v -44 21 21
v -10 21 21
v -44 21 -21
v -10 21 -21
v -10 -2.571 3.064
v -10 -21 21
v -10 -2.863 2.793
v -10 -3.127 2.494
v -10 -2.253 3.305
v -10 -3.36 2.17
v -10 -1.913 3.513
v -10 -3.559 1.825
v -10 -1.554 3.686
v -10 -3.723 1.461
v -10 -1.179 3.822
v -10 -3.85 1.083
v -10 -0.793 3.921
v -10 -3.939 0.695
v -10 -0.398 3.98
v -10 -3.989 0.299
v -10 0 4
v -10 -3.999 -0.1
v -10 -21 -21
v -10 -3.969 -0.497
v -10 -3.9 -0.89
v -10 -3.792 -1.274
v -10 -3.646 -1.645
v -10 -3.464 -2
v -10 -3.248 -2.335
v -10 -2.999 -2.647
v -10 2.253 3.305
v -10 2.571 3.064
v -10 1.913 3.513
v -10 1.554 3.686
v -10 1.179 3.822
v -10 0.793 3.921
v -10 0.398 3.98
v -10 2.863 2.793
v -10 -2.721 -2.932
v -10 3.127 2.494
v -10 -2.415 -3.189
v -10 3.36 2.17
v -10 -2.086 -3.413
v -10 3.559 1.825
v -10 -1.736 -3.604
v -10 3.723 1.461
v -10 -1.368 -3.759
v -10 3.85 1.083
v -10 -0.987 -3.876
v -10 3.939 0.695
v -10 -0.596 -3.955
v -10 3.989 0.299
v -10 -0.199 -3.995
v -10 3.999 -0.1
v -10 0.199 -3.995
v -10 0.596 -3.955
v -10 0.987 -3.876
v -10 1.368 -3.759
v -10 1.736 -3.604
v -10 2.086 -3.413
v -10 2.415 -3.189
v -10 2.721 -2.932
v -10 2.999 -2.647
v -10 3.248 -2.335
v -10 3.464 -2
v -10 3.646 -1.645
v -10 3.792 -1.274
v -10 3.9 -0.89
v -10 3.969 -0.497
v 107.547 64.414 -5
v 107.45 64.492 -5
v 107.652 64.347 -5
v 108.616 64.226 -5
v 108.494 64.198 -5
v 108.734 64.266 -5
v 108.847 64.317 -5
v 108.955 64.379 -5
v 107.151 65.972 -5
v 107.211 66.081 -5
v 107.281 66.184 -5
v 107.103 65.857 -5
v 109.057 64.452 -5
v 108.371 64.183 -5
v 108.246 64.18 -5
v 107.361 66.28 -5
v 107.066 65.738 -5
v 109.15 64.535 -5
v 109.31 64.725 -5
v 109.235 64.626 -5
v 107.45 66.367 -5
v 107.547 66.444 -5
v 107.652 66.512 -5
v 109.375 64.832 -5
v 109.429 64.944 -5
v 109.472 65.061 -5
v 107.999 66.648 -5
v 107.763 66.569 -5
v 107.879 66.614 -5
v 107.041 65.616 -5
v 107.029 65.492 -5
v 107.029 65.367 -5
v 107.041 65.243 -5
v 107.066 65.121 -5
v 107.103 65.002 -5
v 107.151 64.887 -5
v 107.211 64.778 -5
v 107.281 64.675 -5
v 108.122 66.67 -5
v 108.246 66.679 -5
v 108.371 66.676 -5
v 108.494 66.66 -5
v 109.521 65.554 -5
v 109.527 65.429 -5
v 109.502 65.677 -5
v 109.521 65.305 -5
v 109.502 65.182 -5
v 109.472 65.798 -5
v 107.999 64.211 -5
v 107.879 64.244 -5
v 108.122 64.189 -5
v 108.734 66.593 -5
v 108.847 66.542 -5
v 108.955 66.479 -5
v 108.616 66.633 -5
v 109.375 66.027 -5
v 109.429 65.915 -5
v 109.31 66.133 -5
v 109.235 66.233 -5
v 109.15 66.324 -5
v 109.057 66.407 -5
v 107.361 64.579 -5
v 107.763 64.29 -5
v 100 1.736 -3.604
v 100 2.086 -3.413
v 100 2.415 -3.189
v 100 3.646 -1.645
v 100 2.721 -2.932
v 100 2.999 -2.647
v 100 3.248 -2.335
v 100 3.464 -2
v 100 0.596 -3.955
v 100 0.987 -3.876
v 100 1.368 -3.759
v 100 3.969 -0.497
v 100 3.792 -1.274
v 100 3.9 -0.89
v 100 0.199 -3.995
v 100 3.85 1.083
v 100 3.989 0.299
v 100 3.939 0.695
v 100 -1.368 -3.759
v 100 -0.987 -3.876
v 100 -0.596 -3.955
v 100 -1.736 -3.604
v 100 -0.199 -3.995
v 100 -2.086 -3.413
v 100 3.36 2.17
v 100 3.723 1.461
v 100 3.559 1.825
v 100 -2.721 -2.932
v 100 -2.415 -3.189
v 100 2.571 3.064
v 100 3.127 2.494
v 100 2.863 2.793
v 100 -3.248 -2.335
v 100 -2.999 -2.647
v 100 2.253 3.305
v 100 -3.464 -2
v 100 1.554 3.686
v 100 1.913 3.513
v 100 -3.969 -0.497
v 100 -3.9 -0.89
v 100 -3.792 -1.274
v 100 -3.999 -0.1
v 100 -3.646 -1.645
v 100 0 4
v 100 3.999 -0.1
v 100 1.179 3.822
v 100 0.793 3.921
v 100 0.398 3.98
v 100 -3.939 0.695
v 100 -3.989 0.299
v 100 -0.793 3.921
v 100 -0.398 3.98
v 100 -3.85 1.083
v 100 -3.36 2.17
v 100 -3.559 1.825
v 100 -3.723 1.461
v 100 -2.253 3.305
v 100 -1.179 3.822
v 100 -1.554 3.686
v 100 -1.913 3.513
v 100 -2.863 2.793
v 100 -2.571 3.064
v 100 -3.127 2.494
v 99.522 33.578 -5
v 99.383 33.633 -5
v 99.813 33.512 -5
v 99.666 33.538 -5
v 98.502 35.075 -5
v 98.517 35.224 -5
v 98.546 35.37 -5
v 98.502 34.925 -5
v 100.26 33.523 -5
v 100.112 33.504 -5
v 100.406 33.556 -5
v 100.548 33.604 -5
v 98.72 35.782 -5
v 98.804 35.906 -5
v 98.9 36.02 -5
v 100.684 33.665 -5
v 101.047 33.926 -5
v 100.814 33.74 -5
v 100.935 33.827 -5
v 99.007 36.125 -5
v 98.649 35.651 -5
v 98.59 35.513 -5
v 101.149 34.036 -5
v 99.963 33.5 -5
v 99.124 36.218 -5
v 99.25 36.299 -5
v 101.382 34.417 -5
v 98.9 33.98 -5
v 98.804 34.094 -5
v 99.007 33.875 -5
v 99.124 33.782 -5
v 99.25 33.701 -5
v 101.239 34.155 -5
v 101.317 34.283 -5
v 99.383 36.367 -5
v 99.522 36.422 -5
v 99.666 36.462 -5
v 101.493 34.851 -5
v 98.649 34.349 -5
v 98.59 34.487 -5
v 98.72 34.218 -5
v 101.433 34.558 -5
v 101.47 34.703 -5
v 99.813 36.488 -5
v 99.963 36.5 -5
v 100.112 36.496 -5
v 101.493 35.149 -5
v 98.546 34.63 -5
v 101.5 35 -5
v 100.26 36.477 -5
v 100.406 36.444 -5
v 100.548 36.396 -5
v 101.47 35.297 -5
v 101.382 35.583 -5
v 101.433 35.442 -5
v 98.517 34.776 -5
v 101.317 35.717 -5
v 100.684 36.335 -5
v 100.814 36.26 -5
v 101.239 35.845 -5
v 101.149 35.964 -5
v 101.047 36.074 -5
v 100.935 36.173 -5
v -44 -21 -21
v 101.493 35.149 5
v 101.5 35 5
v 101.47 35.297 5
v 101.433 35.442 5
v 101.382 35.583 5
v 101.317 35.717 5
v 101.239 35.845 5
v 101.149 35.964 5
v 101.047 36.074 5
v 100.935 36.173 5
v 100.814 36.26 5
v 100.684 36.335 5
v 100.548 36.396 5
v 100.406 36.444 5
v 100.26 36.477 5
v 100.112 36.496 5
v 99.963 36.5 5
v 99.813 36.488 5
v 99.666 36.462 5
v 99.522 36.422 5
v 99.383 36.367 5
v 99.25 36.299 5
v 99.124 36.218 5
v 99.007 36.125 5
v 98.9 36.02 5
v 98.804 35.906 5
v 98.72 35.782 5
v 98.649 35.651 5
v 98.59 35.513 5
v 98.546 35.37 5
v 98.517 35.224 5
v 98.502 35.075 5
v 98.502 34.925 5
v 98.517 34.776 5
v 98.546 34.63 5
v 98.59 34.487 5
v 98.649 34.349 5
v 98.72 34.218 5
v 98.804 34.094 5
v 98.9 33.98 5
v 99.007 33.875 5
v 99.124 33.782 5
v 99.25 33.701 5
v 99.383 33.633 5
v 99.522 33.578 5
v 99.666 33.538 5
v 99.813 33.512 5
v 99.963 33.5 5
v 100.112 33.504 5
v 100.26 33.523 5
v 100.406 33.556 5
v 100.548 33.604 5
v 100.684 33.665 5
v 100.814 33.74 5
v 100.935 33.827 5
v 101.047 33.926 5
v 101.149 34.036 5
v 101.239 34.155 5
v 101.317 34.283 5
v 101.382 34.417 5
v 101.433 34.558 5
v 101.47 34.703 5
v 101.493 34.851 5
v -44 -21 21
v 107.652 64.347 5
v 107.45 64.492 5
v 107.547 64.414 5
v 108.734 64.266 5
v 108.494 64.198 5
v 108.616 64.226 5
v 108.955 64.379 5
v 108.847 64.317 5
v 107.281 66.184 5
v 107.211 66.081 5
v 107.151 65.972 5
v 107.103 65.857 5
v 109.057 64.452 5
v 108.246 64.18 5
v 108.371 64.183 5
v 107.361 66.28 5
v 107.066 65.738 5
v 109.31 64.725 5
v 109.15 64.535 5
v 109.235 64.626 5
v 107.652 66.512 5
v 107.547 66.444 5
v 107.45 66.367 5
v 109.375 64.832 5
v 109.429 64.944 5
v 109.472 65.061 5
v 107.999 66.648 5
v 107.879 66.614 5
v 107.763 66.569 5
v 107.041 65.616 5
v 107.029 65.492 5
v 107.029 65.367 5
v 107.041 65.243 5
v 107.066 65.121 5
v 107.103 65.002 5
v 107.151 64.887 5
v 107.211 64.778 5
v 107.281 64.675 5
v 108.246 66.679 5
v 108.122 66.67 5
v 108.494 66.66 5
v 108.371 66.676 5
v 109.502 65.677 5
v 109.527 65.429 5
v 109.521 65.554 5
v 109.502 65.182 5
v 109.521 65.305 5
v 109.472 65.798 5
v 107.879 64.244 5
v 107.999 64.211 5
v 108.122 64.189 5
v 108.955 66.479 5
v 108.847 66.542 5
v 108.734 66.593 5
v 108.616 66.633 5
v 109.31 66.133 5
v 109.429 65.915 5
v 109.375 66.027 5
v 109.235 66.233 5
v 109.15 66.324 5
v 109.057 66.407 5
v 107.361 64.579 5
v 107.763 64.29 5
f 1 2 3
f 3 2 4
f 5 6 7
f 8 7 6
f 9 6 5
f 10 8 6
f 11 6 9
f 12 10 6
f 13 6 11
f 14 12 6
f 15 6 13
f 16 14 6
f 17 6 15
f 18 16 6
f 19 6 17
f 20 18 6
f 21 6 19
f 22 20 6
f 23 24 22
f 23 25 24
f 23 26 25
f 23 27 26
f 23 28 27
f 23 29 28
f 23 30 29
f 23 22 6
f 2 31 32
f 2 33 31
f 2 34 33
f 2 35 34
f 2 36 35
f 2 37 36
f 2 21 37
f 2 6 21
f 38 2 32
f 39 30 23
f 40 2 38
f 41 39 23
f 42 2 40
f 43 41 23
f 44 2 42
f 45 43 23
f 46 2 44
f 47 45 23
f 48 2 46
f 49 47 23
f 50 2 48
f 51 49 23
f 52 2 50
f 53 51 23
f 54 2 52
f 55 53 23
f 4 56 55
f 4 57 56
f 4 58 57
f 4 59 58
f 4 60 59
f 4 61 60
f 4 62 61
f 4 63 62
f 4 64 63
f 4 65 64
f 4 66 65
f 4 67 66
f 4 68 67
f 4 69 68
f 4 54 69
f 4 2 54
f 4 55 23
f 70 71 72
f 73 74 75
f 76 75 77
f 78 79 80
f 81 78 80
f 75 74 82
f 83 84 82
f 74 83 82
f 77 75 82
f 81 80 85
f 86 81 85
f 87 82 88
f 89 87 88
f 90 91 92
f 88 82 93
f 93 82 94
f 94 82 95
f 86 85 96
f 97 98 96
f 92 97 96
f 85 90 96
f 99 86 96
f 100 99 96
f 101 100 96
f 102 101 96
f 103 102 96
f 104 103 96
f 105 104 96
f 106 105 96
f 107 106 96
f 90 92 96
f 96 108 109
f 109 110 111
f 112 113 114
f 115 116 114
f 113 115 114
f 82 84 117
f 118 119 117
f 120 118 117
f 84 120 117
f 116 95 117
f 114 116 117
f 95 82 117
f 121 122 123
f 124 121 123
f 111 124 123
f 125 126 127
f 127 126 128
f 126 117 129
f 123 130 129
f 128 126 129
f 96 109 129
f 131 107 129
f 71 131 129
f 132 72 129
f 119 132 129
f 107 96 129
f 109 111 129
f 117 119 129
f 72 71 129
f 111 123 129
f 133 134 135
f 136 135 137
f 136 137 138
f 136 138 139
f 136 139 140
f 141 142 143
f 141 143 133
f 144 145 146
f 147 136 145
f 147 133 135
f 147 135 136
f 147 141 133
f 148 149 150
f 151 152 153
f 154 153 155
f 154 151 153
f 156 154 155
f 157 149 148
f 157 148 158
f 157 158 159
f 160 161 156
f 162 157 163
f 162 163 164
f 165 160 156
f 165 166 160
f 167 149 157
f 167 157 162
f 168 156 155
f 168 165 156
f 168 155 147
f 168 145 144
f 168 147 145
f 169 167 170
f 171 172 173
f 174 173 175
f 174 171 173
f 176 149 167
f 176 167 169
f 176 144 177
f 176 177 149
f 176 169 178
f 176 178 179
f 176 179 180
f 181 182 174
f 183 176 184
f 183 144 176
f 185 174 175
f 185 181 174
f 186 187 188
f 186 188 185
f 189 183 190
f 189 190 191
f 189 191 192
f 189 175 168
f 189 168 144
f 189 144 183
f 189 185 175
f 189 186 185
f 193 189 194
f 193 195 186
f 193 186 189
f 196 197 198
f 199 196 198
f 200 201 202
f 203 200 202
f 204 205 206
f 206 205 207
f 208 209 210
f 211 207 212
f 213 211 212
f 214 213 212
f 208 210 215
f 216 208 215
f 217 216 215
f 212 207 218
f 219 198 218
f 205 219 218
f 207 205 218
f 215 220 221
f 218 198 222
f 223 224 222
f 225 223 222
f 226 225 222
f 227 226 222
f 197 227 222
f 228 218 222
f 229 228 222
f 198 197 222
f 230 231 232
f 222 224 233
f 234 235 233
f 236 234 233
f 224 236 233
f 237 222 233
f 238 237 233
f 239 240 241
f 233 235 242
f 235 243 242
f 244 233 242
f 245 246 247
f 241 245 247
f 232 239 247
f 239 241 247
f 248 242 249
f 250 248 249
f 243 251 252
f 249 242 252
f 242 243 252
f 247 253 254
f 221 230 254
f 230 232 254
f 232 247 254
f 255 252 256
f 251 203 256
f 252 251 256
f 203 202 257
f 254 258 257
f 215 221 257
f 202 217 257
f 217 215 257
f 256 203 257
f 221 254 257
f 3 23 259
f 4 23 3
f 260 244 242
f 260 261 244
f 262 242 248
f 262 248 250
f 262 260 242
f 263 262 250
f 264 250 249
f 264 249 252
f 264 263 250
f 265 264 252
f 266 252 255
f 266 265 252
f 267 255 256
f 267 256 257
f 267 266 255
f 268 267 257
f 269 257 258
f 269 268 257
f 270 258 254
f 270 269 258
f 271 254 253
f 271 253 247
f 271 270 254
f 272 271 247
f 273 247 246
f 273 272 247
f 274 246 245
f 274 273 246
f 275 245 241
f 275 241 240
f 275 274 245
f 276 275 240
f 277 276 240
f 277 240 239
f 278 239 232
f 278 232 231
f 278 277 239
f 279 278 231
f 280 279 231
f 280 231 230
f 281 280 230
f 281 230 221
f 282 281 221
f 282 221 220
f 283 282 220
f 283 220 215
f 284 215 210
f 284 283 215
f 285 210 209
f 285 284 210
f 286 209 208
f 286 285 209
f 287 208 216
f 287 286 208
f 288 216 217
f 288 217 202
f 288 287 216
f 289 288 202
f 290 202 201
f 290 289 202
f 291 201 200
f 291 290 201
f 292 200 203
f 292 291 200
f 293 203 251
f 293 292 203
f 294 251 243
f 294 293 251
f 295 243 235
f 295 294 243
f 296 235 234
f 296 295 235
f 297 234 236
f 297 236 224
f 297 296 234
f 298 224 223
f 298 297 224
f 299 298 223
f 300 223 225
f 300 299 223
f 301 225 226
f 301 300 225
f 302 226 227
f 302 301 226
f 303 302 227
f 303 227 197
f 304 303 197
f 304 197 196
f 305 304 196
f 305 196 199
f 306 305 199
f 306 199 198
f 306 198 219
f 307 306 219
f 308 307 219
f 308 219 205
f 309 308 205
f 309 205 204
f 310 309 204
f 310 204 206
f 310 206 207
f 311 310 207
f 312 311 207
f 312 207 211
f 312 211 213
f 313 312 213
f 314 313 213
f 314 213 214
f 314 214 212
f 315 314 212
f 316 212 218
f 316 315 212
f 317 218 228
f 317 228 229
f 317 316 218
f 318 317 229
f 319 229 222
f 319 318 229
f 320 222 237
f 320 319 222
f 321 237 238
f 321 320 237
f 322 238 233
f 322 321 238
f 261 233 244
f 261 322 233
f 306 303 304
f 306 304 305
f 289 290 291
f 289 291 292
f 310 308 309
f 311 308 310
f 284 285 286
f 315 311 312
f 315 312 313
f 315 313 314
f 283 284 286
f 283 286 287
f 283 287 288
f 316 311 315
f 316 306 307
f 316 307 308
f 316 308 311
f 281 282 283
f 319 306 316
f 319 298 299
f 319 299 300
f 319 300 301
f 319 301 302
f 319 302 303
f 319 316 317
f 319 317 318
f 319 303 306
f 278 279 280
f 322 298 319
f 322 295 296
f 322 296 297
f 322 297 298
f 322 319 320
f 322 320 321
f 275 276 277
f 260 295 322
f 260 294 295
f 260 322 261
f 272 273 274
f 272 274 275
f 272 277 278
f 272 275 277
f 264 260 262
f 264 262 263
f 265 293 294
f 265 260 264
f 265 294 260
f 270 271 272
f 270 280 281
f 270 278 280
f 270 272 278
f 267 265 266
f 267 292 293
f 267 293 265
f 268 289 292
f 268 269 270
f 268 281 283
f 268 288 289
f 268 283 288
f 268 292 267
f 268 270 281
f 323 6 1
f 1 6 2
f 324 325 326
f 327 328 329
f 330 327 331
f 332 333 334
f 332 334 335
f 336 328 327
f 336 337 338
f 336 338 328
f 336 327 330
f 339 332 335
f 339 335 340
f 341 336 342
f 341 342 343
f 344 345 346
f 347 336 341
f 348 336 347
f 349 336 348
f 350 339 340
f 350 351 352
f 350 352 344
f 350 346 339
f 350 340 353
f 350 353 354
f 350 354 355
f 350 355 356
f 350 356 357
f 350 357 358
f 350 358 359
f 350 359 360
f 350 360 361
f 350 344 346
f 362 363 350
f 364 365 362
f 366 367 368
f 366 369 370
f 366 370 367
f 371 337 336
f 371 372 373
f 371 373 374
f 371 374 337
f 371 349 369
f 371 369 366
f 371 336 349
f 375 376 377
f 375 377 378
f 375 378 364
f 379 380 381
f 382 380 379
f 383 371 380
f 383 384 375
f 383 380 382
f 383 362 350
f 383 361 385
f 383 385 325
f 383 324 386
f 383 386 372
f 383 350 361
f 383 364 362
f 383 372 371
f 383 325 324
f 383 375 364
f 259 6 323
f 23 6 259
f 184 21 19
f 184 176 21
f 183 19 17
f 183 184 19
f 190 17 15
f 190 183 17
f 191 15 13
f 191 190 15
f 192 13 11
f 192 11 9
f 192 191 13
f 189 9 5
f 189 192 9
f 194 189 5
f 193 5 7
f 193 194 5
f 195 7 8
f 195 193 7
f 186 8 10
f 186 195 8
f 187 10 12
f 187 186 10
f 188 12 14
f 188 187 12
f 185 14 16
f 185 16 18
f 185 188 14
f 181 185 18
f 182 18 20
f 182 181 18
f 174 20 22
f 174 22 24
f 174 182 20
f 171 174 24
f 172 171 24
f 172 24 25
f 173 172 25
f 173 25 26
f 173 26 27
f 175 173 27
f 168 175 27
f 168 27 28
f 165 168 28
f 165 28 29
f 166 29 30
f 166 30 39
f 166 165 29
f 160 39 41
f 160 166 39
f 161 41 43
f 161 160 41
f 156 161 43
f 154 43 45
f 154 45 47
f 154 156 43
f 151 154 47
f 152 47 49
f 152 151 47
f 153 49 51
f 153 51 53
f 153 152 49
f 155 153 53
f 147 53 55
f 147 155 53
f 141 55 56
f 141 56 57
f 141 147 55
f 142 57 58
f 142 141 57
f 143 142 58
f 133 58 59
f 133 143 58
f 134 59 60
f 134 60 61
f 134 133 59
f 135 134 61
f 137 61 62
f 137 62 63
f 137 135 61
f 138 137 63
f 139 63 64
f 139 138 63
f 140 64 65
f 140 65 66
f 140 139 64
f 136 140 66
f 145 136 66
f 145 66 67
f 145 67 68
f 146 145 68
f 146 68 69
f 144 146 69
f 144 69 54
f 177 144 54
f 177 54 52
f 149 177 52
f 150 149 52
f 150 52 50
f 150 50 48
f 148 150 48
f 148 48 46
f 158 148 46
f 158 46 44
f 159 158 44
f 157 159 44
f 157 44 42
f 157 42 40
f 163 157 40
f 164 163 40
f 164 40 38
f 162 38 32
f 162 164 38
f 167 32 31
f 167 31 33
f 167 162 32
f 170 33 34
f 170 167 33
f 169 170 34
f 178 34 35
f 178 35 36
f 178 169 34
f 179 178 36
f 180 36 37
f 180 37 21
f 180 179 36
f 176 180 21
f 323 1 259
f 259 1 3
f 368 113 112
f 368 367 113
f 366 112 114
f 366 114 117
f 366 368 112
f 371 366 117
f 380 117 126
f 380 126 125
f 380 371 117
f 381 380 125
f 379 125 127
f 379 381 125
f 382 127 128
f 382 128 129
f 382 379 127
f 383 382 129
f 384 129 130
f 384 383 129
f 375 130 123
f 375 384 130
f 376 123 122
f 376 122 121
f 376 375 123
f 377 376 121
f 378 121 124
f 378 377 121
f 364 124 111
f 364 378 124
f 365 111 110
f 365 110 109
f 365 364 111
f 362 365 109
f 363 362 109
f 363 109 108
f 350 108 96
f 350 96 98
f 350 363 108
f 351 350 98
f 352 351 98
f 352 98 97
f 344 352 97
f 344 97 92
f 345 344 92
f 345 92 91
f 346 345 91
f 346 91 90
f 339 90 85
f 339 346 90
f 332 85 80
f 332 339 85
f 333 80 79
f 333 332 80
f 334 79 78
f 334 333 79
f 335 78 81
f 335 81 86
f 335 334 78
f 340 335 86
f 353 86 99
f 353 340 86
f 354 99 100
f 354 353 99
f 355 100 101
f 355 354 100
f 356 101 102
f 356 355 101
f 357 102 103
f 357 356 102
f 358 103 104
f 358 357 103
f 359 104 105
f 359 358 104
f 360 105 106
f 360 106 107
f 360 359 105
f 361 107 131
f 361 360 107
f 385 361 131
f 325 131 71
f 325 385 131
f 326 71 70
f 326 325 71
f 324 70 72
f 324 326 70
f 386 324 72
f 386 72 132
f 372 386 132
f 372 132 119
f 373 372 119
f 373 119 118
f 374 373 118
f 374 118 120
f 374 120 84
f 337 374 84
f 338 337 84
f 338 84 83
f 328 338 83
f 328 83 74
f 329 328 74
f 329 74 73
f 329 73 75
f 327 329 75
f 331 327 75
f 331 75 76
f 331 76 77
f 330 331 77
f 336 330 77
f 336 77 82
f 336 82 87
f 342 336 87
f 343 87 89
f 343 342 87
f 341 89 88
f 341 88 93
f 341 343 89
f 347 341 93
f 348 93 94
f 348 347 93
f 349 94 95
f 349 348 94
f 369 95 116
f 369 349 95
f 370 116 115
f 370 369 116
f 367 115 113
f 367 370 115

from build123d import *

# Parameters (mm, degrees)
SKETCH_1_W          = 42
SKETCH_1_H          = 42
EXTRUDE_1_DEPTH     = 44
SKETCH_2_R          = 4
EXTRUDE_2_DEPTH     = 100
SKETCH_5_R          = 1.5
EXTRUDE_3_DEPTH     = 5
SKETCH_6_R          = 1.25
EXTRUDE_4_DEPTH     = 5
SKETCH_1_2_W        = 42
SKETCH_1_2_H        = 42
CUT_EXTRUDE_1_DEPTH = 10
SKETCH_2_2_R        = 4
EXTRUDE_5_DEPTH     = 20


with BuildPart() as part:
    # 草图1 → 凸台-拉伸1 (new body)
    with BuildSketch(Plane(origin=(0, 0, 0), x_dir=(0, 0, -1), z_dir=(1, 0, 0))):
        Rectangle(SKETCH_1_W, SKETCH_1_H)
    extrude(amount=-EXTRUDE_1_DEPTH)

    # 草图2 → 凸台-拉伸2 (add)
    with BuildSketch(Plane(origin=(0, 0, 0), x_dir=(0, 0, -1), z_dir=(1, 0, 0))):
        Circle(SKETCH_2_R)
    extrude(amount=EXTRUDE_2_DEPTH)

    # 草图1<2> → 切除-拉伸1 (cut)
    with BuildSketch(Plane(origin=(0, 0, 0), x_dir=(0, 0, -1), z_dir=(1, 0, 0))):
        Rectangle(SKETCH_1_2_W, SKETCH_1_2_H)
    extrude(amount=-CUT_EXTRUDE_1_DEPTH, mode=Mode.SUBTRACT)


with BuildPart() as body_2:
    # 草图5 → 凸台-拉伸3 (new, symmetric)
    with BuildSketch(Plane.XY):
        with Locations((100, 35)):
            Circle(SKETCH_5_R)
    extrude(amount=EXTRUDE_3_DEPTH, both=True)


with BuildPart() as body_3:
    # 草图6 → 凸台-拉伸4 (new, symmetric)
    with BuildSketch(Plane.XY):
        with Locations((108.27716468, 65.429340608)):
            Circle(SKETCH_6_R)
    extrude(amount=EXTRUDE_4_DEPTH, both=True)


with BuildPart() as cut_extrude_1_piece_1:
    # of the separate pieces the step leaves, piece 1, a body of its own (cut_extrude_1_pieces)
    add(part.part.solids().sort_by_distance((-10, -21, 21))[0])



with BuildPart() as cut_extrude_1_piece_2:
    # of the separate pieces the step leaves, piece 2, a body of its own (cut_extrude_1_pieces)
    add(part.part.solids().sort_by_distance((0, 0, -4))[0])


with BuildPart() as cut_extrude_1_piece_1_1:
    add(cut_extrude_1_piece_1.part)

    add(cut_extrude_1_piece_2.part)  # 凸台-拉伸5 merges 切除-拉伸1 piece 2
    # 草图2<2> → 凸台-拉伸5 (add)
    with BuildSketch(Plane(origin=(0, 0, 0), x_dir=(0, 0, -1), z_dir=(1, 0, 0))):
        Circle(SKETCH_2_2_R)
    extrude(amount=-EXTRUDE_5_DEPTH)


solid = Compound([body_2.part, body_3.part, cut_extrude_1_piece_1_1.part])
